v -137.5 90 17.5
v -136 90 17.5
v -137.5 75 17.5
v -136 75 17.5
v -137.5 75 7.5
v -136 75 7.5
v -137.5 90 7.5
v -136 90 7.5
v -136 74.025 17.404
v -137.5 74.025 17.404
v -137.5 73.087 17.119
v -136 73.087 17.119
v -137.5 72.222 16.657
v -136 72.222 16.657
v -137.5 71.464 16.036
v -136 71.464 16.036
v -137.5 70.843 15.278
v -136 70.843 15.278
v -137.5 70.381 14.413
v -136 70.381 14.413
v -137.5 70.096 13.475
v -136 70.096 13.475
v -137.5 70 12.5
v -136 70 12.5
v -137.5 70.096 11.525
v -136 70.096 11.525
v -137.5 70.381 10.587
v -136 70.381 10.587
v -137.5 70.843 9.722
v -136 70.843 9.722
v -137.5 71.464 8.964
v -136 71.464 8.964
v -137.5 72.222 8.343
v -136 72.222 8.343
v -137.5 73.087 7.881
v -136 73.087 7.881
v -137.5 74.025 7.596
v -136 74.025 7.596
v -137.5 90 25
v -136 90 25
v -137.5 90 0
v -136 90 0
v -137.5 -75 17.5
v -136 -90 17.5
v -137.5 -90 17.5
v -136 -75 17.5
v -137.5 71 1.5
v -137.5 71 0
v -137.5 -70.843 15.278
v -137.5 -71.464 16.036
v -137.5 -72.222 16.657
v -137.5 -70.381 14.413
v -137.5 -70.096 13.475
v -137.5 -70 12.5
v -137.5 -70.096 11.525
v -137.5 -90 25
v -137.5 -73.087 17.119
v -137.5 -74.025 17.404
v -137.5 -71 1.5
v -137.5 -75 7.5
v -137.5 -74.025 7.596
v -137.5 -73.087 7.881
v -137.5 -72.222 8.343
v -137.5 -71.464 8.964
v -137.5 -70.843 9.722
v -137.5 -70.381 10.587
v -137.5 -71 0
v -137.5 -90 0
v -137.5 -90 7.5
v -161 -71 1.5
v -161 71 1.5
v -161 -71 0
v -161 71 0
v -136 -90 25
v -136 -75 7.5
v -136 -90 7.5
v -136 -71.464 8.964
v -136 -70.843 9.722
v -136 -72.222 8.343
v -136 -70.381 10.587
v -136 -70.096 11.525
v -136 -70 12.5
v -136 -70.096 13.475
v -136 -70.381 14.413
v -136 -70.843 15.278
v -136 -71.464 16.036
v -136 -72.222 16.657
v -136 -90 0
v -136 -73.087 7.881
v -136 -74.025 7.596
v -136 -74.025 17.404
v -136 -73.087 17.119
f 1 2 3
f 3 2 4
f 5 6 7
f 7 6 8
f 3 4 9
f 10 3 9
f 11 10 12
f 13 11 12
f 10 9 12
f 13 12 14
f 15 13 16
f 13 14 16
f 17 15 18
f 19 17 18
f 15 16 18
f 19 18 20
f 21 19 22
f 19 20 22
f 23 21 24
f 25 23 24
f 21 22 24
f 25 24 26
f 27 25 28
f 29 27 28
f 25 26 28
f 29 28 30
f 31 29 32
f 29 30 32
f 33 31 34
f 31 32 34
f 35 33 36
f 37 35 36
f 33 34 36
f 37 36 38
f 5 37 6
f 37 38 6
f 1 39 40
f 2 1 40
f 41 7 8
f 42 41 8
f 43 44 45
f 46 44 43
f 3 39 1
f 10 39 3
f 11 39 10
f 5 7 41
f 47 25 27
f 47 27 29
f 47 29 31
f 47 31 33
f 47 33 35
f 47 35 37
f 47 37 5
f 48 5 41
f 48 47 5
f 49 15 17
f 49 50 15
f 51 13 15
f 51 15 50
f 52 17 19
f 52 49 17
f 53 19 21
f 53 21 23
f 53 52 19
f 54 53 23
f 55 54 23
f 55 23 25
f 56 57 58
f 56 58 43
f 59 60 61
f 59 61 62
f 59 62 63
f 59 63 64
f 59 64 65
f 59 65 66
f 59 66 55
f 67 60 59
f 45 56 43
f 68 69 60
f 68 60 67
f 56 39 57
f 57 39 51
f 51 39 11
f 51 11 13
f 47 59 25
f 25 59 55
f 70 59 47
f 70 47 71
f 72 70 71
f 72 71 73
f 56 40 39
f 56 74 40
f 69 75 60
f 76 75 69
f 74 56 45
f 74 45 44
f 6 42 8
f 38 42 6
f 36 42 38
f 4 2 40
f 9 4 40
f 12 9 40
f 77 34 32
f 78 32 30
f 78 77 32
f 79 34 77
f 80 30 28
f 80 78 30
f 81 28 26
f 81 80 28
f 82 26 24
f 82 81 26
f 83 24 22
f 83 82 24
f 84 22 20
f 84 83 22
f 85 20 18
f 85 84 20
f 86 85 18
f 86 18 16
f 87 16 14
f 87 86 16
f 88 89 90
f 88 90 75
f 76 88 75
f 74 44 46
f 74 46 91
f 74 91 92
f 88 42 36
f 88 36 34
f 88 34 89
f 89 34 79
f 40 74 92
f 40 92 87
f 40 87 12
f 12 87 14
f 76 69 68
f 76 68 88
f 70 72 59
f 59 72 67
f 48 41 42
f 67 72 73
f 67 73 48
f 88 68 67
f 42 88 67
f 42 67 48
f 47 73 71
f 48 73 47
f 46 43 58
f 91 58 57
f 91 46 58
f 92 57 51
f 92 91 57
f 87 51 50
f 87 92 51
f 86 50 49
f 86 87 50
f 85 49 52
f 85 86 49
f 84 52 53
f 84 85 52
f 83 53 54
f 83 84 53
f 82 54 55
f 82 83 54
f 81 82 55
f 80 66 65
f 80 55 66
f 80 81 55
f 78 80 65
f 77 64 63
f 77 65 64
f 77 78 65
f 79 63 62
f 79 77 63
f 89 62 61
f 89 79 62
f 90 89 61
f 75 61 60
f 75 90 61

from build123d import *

# Parameters (mm, degrees)
PAD040_DEPTH    = 90
SKETCH062_W     = 23.5
SKETCH062_H     = 19
POCKET016_DEPTH = 1.5
POCKET017_DEPTH = 5


with BuildPart() as part:
    # Sketch061 → Pad040 (new body, symmetric)
    with BuildSketch(Plane.XZ):
        Polygon((-1.5, 25), (-1.5, 1.5), (-25, 1.5), (-25, 0), (0, 0), (0, 25), align=None)
    extrude(amount=PAD040_DEPTH, both=True)

    # Sketch062 → Pocket016 (cut)
    with BuildSketch(Plane.XY):
        with Locations((-13.25, 80.5)):
            Rectangle(SKETCH062_W, SKETCH062_H)
    pocket016 = extrude(amount=POCKET016_DEPTH, mode=Mode.SUBTRACT)

    # Sketch063 → Pocket017 (cut)
    with BuildSketch(Plane.YZ):
        with BuildLine():
            ThreePointArc((75, 17.5), (70, 12.5), (75, 7.5))
            Line((75, 7.5), (90, 7.5))
            Line((90, 7.5), (90, 17.5))
            Line((90, 17.5), (75, 17.5))
        make_face()
    pocket017 = extrude(amount=-POCKET017_DEPTH, mode=Mode.SUBTRACT)

    # Mirrored018: Pocket017, Pocket016 across Sketch063 V_Axis
    add(pocket017.mirror(Plane(origin=(0, 0, 0), x_dir=(1, 0, 0), z_dir=(0, 1, 0))), mode=Mode.SUBTRACT)
    add(pocket016.mirror(Plane(origin=(0, 0, 0), x_dir=(1, 0, 0), z_dir=(0, 1, 0))), mode=Mode.SUBTRACT)


with BuildPart() as part_1:
    # Body031 placement: moved
    add(part.part.moved(Location((-136, 0, 0))))


solid = part_1.part
